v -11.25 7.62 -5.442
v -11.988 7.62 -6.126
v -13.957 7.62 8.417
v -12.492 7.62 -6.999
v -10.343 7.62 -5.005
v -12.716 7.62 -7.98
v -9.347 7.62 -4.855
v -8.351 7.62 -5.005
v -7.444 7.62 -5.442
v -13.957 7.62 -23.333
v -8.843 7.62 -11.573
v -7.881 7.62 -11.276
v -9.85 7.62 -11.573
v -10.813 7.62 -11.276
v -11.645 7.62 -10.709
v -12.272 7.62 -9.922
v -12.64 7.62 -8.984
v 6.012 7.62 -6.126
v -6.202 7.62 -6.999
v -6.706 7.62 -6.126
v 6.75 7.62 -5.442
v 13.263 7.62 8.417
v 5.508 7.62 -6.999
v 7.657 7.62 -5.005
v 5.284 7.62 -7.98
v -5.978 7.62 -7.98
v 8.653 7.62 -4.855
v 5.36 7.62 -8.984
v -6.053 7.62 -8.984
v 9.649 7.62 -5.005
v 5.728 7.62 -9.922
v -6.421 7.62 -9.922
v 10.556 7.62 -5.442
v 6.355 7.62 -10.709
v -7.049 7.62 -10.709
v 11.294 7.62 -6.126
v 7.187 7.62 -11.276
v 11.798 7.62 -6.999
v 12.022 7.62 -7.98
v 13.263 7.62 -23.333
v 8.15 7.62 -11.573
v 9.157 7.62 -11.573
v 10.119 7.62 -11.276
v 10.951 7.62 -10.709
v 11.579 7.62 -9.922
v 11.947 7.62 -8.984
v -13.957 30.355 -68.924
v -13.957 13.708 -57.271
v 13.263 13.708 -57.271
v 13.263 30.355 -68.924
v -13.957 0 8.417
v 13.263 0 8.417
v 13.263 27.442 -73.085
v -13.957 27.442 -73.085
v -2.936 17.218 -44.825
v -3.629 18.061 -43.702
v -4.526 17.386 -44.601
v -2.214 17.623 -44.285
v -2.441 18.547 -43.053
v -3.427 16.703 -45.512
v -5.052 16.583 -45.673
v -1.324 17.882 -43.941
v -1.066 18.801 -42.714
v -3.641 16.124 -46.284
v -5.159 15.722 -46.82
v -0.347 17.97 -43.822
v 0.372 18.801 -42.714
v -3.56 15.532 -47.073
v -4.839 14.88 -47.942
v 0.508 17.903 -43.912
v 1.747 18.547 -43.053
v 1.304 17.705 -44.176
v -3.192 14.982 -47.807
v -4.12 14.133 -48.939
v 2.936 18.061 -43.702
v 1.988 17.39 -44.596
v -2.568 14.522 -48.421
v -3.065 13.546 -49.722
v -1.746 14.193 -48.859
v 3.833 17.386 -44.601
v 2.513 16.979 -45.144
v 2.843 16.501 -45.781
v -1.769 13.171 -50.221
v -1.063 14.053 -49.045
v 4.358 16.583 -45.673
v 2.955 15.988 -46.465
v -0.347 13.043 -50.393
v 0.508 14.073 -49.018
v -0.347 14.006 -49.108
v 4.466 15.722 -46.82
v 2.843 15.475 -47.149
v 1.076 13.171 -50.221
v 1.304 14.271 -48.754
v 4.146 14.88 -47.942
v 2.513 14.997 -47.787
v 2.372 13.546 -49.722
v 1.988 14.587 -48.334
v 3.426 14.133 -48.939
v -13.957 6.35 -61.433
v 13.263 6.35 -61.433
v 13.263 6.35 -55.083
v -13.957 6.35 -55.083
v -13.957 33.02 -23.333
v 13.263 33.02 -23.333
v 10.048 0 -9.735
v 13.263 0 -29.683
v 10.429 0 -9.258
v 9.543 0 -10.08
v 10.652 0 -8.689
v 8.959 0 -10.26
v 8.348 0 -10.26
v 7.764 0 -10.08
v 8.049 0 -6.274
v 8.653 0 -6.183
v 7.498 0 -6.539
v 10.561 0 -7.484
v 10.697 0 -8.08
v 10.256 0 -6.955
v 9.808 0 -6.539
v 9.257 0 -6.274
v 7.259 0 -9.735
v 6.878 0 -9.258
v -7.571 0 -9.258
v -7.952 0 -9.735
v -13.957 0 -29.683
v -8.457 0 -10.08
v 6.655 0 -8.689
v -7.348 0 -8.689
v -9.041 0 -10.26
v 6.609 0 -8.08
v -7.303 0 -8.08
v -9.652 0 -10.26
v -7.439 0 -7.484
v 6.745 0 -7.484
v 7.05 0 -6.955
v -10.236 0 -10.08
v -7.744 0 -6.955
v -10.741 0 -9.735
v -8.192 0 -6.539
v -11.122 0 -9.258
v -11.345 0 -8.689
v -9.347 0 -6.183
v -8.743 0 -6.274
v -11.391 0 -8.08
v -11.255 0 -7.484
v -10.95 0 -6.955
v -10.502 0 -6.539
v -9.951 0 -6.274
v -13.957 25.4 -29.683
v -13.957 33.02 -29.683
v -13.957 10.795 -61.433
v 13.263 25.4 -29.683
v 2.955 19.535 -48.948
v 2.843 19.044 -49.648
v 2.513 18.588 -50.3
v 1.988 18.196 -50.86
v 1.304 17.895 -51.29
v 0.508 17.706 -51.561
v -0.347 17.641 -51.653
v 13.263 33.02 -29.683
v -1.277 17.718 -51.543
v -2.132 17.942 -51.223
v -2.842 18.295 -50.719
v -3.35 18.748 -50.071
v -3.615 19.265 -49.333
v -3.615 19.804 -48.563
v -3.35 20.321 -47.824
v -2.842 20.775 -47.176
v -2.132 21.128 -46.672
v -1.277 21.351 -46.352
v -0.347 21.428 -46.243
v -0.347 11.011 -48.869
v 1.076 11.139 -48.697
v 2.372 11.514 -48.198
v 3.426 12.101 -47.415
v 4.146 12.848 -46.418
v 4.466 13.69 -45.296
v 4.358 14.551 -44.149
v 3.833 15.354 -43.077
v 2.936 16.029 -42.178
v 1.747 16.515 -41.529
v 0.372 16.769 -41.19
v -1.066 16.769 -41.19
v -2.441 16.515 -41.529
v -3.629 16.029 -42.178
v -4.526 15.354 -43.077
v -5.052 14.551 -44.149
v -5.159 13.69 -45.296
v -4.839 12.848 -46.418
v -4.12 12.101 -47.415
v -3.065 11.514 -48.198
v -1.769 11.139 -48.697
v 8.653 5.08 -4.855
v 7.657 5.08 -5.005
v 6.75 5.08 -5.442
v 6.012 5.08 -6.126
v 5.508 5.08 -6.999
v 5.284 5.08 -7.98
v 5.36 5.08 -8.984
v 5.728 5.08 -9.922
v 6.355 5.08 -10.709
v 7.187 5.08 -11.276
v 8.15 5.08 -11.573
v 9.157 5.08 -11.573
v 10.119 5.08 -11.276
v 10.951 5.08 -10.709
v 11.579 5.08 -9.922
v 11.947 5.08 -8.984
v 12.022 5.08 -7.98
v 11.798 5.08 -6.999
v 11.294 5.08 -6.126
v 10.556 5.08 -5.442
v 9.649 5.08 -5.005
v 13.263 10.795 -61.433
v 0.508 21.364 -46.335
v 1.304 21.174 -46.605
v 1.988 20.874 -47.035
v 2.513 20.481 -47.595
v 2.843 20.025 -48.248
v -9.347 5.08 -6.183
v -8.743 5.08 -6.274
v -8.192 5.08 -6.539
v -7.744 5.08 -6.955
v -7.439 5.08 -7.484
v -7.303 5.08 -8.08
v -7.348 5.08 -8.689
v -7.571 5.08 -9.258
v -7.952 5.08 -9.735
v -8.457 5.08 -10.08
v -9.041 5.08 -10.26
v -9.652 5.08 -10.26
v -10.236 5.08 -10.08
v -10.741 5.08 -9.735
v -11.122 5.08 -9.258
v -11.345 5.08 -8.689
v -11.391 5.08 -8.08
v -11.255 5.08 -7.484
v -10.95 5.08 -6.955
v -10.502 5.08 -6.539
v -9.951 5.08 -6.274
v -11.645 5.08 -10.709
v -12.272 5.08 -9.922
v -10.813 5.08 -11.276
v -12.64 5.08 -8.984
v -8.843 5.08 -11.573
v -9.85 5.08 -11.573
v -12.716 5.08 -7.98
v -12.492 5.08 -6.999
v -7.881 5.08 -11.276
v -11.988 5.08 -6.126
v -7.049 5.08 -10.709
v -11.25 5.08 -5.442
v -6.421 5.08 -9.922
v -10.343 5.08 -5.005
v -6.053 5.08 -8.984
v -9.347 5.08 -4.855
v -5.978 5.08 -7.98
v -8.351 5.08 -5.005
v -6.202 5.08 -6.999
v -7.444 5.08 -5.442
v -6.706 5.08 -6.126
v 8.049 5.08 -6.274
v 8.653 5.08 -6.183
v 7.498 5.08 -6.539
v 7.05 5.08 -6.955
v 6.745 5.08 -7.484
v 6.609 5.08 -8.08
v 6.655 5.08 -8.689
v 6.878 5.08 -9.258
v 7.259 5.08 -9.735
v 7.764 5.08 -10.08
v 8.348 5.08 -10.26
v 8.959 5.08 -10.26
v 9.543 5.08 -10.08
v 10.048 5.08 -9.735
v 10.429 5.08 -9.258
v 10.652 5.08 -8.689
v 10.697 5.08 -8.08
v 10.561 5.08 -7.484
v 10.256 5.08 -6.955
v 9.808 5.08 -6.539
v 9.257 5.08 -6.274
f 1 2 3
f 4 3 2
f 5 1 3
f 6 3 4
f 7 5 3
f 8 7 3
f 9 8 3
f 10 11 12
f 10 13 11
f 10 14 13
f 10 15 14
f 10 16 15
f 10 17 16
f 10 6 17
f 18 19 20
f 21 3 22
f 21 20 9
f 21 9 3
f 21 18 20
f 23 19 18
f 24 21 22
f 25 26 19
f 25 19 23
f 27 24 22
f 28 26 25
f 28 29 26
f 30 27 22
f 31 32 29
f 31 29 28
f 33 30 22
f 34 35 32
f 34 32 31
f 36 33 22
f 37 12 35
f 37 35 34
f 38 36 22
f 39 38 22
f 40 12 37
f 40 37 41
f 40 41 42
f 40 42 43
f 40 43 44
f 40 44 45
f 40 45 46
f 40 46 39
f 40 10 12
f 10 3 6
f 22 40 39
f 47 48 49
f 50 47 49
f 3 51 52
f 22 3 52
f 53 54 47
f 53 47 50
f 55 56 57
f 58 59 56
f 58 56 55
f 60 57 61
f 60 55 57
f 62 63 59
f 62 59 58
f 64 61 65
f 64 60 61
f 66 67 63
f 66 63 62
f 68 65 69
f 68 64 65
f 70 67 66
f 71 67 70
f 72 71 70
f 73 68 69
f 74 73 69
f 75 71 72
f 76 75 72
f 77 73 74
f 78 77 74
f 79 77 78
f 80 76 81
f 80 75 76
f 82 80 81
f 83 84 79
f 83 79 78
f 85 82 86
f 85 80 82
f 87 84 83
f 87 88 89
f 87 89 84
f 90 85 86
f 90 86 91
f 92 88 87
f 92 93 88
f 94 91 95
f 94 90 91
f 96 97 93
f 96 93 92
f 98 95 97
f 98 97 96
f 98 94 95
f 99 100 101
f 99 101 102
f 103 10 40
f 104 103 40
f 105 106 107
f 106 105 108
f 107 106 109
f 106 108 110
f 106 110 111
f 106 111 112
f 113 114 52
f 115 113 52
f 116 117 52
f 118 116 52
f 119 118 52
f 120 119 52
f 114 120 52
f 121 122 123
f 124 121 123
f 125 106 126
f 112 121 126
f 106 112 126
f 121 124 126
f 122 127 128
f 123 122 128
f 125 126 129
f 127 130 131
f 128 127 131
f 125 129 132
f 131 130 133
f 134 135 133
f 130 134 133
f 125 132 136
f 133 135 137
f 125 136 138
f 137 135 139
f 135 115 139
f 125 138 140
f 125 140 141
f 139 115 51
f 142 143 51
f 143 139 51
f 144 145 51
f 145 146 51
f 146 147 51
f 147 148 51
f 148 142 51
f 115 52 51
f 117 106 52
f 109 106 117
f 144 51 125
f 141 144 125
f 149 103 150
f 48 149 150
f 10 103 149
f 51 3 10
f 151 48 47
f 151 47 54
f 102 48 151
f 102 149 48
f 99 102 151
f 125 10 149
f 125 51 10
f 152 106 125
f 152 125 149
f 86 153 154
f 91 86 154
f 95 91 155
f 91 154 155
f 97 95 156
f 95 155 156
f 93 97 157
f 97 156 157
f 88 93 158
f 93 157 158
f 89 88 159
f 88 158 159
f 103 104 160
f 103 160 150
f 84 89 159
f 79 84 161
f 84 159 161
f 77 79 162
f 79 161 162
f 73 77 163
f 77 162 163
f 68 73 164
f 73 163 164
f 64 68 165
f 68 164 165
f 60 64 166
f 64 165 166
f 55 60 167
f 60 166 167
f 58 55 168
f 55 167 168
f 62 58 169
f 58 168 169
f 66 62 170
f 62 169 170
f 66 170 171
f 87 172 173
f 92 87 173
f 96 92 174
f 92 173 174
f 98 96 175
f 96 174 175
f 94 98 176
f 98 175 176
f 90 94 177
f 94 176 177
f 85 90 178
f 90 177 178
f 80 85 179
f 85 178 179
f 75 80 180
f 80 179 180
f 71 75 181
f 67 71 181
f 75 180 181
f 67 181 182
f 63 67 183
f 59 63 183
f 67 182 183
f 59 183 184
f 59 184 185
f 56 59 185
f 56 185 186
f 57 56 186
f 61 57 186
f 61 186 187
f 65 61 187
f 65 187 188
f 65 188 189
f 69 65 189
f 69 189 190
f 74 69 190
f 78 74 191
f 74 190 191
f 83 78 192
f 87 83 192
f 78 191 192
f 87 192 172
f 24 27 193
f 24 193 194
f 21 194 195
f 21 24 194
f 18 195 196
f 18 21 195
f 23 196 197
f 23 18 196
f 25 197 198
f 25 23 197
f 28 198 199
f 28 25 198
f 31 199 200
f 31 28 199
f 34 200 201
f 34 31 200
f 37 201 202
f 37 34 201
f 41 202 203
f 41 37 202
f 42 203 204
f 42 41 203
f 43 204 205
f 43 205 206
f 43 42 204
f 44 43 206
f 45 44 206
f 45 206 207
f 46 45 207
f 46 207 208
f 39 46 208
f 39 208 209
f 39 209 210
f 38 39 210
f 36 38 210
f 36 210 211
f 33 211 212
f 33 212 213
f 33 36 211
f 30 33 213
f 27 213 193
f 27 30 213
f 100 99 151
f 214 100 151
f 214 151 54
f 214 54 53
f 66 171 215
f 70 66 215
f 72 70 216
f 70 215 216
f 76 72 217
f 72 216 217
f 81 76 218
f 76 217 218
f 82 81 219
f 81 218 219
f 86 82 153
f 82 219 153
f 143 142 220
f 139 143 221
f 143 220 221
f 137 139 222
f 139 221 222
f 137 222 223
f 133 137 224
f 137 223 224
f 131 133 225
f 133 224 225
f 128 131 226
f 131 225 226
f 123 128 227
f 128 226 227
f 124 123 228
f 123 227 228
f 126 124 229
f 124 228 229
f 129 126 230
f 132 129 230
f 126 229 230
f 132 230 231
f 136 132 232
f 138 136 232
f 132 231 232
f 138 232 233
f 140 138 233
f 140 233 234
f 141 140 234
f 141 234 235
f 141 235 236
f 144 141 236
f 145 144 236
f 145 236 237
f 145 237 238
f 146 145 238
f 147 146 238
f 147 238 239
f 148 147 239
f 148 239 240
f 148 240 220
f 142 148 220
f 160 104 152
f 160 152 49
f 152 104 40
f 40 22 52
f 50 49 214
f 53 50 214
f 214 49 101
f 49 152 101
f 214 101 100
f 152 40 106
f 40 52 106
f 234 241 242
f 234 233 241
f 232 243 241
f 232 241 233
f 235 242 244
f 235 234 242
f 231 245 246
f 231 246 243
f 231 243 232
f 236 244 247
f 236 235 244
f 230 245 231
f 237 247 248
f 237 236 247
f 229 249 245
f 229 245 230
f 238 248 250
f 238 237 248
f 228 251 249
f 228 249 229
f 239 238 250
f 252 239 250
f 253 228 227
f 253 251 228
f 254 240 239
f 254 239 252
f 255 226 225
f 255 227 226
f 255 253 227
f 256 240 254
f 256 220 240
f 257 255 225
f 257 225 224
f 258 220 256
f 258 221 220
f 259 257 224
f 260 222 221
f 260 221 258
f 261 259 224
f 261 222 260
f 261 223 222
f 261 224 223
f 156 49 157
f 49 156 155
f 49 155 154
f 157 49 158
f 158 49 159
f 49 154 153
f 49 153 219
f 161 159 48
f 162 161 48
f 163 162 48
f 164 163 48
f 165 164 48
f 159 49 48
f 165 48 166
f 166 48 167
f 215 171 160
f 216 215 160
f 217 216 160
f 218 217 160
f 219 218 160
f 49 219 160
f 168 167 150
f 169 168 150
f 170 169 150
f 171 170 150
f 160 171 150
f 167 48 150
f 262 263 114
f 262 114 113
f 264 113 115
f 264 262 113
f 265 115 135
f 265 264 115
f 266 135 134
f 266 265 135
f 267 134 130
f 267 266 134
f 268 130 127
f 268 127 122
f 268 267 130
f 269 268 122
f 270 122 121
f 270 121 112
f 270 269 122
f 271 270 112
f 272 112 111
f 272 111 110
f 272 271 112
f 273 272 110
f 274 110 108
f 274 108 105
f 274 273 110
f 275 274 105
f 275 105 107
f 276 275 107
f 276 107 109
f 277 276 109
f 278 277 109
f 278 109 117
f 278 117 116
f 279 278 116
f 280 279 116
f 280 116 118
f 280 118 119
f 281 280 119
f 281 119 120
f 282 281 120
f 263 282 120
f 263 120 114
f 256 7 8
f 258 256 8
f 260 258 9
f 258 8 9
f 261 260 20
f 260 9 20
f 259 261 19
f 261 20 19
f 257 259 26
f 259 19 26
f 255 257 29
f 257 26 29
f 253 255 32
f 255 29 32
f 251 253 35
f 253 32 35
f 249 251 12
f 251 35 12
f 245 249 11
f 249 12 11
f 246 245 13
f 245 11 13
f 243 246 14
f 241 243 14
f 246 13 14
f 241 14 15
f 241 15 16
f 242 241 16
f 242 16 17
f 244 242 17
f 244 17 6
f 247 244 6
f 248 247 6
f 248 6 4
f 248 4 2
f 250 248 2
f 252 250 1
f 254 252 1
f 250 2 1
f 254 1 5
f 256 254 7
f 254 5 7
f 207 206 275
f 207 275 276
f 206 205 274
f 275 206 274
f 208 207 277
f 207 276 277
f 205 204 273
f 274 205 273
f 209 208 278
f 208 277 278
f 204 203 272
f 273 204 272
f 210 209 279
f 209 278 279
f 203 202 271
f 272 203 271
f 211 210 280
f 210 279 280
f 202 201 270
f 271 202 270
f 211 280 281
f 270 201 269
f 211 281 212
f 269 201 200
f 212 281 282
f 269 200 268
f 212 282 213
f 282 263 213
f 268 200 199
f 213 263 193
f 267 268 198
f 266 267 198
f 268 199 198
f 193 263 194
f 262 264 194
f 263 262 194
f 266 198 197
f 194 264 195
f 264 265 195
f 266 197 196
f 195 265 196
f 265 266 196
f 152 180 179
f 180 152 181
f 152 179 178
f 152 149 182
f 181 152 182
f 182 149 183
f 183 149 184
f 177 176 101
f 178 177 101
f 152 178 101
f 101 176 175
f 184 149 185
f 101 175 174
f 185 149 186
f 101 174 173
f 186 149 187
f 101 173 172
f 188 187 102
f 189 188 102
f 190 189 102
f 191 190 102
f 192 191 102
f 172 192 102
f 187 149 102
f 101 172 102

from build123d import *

# Parameters (mm, degrees)
SKETCH1_W           = 27.22
SKETCH1_H           = 50.8
BOSS_EXTRUDE1_DEPTH = 7.62
SKETCH2_R           = 2.05
CUT_EXTRUDE1_DEPTH  = 7.62
SKETCH3_R           = 3.3782
CUT_EXTRUDE2_DEPTH  = 2.54
SKETCH4_W           = 27.22
SKETCH4_H           = 19.05
BOSS_EXTRUDE2_DEPTH = 25.4
SKETCH5_W           = 27.22
SKETCH5_H           = 33.02
BOSS_EXTRUDE3_DEPTH = 25.4
SKETCH7_W           = 27.22
SKETCH7_H           = 6.35
CUT_EXTRUDE3_DEPTH  = 38.1
CUT_EXTRUDE4_DEPTH  = 27.94
CUT_EXTRUDE5_DEPTH  = 27.94
CUT_EXTRUDE6_DEPTH  = 27.94
SKETCH12_W          = 27.22
SKETCH12_H          = 5.08
BOSS_EXTRUDE5_DEPTH = 20.32
CUT_EXTRUDE8_DEPTH  = 12.7
SKETCH16_R          = 4.826
CUT_EXTRUDE9_DEPTH  = 2.54


with BuildPart() as part:
    # Sketch1 → Boss-Extrude1 (new body)
    with BuildSketch(Plane(origin=(0, 0, 0), x_dir=(1, 0, 0), z_dir=(0, 1, 0))):
        with Locations((-0.346834532, 16.982733813)):
            Rectangle(SKETCH1_W, SKETCH1_H)
    extrude(amount=BOSS_EXTRUDE1_DEPTH)

    # Sketch2 → Cut-Extrude1 (cut)
    with BuildSketch(Plane(origin=(0, 7.62, 0), x_dir=(1, 0, 0), z_dir=(0, 1, 0))):
        with Locations(Location((-9.346834532, 8.232733813, 0), (0, 0, 270))):
            Circle(SKETCH2_R)
    cut_extrude1 = extrude(amount=-CUT_EXTRUDE1_DEPTH, mode=Mode.SUBTRACT)

    # Sketch3 → Cut-Extrude2 (cut)
    with BuildSketch(Plane(origin=(0, 7.62, 0), x_dir=(1, 0, 0), z_dir=(0, 1, 0))):
        with Locations(Location((-9.346834532, 8.232733813, 0), (0, 0, 270))):
            Circle(SKETCH3_R)
    cut_extrude2 = extrude(amount=-CUT_EXTRUDE2_DEPTH, mode=Mode.SUBTRACT)

    # Mirror1: Cut-Extrude1, Cut-Extrude2 across plane
    add(cut_extrude1.mirror(Plane.ZY.offset(0.346834532)), mode=Mode.SUBTRACT)
    add(cut_extrude2.mirror(Plane.ZY.offset(0.346834532)), mode=Mode.SUBTRACT)

    # Sketch4 → Boss-Extrude2 (add)
    with BuildSketch(Plane(origin=(0, 7.62, 0), x_dir=(1, 0, 0), z_dir=(0, 1, 0))):
        with Locations((-0.346834532, 32.857733813)):
            Rectangle(SKETCH4_W, SKETCH4_H)
    extrude(amount=BOSS_EXTRUDE2_DEPTH)

    # Sketch5 → Boss-Extrude3 (add)
    with BuildSketch(Plane(origin=(0, 0, -42.382733813), x_dir=(-1, 0, 0), z_dir=(0, 0, -1))):
        with Locations((0.346834532, 16.51)):
            Rectangle(SKETCH5_W, SKETCH5_H)
    extrude(amount=BOSS_EXTRUDE3_DEPTH)

    # Sketch7 → Cut-Extrude3 (cut)
    with BuildSketch(Plane(origin=(0, 0, -67.782733813), x_dir=(-1, 0, 0), z_dir=(0, 0, -1))):
        with Locations((0.346834532, 3.175)):
            Rectangle(SKETCH7_W, SKETCH7_H)
    extrude(amount=-CUT_EXTRUDE3_DEPTH, mode=Mode.SUBTRACT)

    # Sketch8 → Cut-Extrude4 (cut)
    with BuildSketch(Plane.ZY.offset(13.956834532)):
        Polygon((-29.682733813, 6.35), (-29.682733813, 25.4), (-55.082733813, 6.35), align=None)
    extrude(amount=-CUT_EXTRUDE4_DEPTH, mode=Mode.SUBTRACT)

    # Sketch9 → Cut-Extrude5 (cut)
    with BuildSketch(Plane.ZY.offset(13.956834532)):
        Polygon((-67.782733813, 33.02), (-67.782733813, 6.35), (-29.682733813, 33.02), align=None)
    extrude(amount=-CUT_EXTRUDE5_DEPTH, mode=Mode.SUBTRACT)

    # Sketch11 → Cut-Extrude6 (cut)
    with BuildSketch(Plane.ZY.offset(13.956834532)):
        Polygon((-61.432733813, 6.35), (-61.432733813, 10.795), (-67.782733813, 6.35), align=None)
    extrude(amount=-CUT_EXTRUDE6_DEPTH, mode=Mode.SUBTRACT)

    # Sketch12 → Boss-Extrude5 (add)
    with BuildSketch(Plane(origin=(0, 36.105982328, -25.27418763), x_dir=(1, 0, 0), z_dir=(0, 0.8192319205190405, -0.5734623443633285))):
        with Locations((-0.346834532, 41.597130497)):
            Rectangle(SKETCH12_W, SKETCH12_H)
    extrude(amount=BOSS_EXTRUDE5_DEPTH)

    # Sketch15 → Cut-Extrude8 (cut)
    with BuildSketch(Plane(origin=(0, 36.105982328, -25.27418763), x_dir=(1, 0, 0), z_dir=(0, 0.8192319205190405, -0.5734623443633285))):
        with BuildLine():
            ThreePointArc((2.955165468, 28.897130497), (1.988032059, 31.231997088), (-0.346834532, 32.199130497))
            Line((-0.346834532, 32.199130497), (-0.346834532, 25.595130497))
            ThreePointArc((-0.346834532, 25.595130497), (1.988032059, 26.562263905), (2.955165468, 28.897130497))
        make_face()
        with BuildLine():
            Line((-0.346834532, 25.595130497), (-0.346834532, 32.199130497))
            ThreePointArc((-0.346834532, 32.199130497), (-3.648834532, 28.897130497), (-0.346834532, 25.595130497))
        make_face()
    extrude(amount=-CUT_EXTRUDE8_DEPTH, mode=Mode.SUBTRACT)

    # Sketch16 → Cut-Extrude9 (cut)
    with BuildSketch(Plane(origin=(0, 30.50371223, -22.877784173), x_dir=(1, 0, 0), z_dir=(0, -0.7999999999999999, 0.6000000000000003))):
        with Locations(Location((-0.346834532, -27.662506101, 0), (0, 0, 270))):
            Circle(SKETCH16_R)
    extrude(amount=-CUT_EXTRUDE9_DEPTH, mode=Mode.SUBTRACT)


solid = part.part
